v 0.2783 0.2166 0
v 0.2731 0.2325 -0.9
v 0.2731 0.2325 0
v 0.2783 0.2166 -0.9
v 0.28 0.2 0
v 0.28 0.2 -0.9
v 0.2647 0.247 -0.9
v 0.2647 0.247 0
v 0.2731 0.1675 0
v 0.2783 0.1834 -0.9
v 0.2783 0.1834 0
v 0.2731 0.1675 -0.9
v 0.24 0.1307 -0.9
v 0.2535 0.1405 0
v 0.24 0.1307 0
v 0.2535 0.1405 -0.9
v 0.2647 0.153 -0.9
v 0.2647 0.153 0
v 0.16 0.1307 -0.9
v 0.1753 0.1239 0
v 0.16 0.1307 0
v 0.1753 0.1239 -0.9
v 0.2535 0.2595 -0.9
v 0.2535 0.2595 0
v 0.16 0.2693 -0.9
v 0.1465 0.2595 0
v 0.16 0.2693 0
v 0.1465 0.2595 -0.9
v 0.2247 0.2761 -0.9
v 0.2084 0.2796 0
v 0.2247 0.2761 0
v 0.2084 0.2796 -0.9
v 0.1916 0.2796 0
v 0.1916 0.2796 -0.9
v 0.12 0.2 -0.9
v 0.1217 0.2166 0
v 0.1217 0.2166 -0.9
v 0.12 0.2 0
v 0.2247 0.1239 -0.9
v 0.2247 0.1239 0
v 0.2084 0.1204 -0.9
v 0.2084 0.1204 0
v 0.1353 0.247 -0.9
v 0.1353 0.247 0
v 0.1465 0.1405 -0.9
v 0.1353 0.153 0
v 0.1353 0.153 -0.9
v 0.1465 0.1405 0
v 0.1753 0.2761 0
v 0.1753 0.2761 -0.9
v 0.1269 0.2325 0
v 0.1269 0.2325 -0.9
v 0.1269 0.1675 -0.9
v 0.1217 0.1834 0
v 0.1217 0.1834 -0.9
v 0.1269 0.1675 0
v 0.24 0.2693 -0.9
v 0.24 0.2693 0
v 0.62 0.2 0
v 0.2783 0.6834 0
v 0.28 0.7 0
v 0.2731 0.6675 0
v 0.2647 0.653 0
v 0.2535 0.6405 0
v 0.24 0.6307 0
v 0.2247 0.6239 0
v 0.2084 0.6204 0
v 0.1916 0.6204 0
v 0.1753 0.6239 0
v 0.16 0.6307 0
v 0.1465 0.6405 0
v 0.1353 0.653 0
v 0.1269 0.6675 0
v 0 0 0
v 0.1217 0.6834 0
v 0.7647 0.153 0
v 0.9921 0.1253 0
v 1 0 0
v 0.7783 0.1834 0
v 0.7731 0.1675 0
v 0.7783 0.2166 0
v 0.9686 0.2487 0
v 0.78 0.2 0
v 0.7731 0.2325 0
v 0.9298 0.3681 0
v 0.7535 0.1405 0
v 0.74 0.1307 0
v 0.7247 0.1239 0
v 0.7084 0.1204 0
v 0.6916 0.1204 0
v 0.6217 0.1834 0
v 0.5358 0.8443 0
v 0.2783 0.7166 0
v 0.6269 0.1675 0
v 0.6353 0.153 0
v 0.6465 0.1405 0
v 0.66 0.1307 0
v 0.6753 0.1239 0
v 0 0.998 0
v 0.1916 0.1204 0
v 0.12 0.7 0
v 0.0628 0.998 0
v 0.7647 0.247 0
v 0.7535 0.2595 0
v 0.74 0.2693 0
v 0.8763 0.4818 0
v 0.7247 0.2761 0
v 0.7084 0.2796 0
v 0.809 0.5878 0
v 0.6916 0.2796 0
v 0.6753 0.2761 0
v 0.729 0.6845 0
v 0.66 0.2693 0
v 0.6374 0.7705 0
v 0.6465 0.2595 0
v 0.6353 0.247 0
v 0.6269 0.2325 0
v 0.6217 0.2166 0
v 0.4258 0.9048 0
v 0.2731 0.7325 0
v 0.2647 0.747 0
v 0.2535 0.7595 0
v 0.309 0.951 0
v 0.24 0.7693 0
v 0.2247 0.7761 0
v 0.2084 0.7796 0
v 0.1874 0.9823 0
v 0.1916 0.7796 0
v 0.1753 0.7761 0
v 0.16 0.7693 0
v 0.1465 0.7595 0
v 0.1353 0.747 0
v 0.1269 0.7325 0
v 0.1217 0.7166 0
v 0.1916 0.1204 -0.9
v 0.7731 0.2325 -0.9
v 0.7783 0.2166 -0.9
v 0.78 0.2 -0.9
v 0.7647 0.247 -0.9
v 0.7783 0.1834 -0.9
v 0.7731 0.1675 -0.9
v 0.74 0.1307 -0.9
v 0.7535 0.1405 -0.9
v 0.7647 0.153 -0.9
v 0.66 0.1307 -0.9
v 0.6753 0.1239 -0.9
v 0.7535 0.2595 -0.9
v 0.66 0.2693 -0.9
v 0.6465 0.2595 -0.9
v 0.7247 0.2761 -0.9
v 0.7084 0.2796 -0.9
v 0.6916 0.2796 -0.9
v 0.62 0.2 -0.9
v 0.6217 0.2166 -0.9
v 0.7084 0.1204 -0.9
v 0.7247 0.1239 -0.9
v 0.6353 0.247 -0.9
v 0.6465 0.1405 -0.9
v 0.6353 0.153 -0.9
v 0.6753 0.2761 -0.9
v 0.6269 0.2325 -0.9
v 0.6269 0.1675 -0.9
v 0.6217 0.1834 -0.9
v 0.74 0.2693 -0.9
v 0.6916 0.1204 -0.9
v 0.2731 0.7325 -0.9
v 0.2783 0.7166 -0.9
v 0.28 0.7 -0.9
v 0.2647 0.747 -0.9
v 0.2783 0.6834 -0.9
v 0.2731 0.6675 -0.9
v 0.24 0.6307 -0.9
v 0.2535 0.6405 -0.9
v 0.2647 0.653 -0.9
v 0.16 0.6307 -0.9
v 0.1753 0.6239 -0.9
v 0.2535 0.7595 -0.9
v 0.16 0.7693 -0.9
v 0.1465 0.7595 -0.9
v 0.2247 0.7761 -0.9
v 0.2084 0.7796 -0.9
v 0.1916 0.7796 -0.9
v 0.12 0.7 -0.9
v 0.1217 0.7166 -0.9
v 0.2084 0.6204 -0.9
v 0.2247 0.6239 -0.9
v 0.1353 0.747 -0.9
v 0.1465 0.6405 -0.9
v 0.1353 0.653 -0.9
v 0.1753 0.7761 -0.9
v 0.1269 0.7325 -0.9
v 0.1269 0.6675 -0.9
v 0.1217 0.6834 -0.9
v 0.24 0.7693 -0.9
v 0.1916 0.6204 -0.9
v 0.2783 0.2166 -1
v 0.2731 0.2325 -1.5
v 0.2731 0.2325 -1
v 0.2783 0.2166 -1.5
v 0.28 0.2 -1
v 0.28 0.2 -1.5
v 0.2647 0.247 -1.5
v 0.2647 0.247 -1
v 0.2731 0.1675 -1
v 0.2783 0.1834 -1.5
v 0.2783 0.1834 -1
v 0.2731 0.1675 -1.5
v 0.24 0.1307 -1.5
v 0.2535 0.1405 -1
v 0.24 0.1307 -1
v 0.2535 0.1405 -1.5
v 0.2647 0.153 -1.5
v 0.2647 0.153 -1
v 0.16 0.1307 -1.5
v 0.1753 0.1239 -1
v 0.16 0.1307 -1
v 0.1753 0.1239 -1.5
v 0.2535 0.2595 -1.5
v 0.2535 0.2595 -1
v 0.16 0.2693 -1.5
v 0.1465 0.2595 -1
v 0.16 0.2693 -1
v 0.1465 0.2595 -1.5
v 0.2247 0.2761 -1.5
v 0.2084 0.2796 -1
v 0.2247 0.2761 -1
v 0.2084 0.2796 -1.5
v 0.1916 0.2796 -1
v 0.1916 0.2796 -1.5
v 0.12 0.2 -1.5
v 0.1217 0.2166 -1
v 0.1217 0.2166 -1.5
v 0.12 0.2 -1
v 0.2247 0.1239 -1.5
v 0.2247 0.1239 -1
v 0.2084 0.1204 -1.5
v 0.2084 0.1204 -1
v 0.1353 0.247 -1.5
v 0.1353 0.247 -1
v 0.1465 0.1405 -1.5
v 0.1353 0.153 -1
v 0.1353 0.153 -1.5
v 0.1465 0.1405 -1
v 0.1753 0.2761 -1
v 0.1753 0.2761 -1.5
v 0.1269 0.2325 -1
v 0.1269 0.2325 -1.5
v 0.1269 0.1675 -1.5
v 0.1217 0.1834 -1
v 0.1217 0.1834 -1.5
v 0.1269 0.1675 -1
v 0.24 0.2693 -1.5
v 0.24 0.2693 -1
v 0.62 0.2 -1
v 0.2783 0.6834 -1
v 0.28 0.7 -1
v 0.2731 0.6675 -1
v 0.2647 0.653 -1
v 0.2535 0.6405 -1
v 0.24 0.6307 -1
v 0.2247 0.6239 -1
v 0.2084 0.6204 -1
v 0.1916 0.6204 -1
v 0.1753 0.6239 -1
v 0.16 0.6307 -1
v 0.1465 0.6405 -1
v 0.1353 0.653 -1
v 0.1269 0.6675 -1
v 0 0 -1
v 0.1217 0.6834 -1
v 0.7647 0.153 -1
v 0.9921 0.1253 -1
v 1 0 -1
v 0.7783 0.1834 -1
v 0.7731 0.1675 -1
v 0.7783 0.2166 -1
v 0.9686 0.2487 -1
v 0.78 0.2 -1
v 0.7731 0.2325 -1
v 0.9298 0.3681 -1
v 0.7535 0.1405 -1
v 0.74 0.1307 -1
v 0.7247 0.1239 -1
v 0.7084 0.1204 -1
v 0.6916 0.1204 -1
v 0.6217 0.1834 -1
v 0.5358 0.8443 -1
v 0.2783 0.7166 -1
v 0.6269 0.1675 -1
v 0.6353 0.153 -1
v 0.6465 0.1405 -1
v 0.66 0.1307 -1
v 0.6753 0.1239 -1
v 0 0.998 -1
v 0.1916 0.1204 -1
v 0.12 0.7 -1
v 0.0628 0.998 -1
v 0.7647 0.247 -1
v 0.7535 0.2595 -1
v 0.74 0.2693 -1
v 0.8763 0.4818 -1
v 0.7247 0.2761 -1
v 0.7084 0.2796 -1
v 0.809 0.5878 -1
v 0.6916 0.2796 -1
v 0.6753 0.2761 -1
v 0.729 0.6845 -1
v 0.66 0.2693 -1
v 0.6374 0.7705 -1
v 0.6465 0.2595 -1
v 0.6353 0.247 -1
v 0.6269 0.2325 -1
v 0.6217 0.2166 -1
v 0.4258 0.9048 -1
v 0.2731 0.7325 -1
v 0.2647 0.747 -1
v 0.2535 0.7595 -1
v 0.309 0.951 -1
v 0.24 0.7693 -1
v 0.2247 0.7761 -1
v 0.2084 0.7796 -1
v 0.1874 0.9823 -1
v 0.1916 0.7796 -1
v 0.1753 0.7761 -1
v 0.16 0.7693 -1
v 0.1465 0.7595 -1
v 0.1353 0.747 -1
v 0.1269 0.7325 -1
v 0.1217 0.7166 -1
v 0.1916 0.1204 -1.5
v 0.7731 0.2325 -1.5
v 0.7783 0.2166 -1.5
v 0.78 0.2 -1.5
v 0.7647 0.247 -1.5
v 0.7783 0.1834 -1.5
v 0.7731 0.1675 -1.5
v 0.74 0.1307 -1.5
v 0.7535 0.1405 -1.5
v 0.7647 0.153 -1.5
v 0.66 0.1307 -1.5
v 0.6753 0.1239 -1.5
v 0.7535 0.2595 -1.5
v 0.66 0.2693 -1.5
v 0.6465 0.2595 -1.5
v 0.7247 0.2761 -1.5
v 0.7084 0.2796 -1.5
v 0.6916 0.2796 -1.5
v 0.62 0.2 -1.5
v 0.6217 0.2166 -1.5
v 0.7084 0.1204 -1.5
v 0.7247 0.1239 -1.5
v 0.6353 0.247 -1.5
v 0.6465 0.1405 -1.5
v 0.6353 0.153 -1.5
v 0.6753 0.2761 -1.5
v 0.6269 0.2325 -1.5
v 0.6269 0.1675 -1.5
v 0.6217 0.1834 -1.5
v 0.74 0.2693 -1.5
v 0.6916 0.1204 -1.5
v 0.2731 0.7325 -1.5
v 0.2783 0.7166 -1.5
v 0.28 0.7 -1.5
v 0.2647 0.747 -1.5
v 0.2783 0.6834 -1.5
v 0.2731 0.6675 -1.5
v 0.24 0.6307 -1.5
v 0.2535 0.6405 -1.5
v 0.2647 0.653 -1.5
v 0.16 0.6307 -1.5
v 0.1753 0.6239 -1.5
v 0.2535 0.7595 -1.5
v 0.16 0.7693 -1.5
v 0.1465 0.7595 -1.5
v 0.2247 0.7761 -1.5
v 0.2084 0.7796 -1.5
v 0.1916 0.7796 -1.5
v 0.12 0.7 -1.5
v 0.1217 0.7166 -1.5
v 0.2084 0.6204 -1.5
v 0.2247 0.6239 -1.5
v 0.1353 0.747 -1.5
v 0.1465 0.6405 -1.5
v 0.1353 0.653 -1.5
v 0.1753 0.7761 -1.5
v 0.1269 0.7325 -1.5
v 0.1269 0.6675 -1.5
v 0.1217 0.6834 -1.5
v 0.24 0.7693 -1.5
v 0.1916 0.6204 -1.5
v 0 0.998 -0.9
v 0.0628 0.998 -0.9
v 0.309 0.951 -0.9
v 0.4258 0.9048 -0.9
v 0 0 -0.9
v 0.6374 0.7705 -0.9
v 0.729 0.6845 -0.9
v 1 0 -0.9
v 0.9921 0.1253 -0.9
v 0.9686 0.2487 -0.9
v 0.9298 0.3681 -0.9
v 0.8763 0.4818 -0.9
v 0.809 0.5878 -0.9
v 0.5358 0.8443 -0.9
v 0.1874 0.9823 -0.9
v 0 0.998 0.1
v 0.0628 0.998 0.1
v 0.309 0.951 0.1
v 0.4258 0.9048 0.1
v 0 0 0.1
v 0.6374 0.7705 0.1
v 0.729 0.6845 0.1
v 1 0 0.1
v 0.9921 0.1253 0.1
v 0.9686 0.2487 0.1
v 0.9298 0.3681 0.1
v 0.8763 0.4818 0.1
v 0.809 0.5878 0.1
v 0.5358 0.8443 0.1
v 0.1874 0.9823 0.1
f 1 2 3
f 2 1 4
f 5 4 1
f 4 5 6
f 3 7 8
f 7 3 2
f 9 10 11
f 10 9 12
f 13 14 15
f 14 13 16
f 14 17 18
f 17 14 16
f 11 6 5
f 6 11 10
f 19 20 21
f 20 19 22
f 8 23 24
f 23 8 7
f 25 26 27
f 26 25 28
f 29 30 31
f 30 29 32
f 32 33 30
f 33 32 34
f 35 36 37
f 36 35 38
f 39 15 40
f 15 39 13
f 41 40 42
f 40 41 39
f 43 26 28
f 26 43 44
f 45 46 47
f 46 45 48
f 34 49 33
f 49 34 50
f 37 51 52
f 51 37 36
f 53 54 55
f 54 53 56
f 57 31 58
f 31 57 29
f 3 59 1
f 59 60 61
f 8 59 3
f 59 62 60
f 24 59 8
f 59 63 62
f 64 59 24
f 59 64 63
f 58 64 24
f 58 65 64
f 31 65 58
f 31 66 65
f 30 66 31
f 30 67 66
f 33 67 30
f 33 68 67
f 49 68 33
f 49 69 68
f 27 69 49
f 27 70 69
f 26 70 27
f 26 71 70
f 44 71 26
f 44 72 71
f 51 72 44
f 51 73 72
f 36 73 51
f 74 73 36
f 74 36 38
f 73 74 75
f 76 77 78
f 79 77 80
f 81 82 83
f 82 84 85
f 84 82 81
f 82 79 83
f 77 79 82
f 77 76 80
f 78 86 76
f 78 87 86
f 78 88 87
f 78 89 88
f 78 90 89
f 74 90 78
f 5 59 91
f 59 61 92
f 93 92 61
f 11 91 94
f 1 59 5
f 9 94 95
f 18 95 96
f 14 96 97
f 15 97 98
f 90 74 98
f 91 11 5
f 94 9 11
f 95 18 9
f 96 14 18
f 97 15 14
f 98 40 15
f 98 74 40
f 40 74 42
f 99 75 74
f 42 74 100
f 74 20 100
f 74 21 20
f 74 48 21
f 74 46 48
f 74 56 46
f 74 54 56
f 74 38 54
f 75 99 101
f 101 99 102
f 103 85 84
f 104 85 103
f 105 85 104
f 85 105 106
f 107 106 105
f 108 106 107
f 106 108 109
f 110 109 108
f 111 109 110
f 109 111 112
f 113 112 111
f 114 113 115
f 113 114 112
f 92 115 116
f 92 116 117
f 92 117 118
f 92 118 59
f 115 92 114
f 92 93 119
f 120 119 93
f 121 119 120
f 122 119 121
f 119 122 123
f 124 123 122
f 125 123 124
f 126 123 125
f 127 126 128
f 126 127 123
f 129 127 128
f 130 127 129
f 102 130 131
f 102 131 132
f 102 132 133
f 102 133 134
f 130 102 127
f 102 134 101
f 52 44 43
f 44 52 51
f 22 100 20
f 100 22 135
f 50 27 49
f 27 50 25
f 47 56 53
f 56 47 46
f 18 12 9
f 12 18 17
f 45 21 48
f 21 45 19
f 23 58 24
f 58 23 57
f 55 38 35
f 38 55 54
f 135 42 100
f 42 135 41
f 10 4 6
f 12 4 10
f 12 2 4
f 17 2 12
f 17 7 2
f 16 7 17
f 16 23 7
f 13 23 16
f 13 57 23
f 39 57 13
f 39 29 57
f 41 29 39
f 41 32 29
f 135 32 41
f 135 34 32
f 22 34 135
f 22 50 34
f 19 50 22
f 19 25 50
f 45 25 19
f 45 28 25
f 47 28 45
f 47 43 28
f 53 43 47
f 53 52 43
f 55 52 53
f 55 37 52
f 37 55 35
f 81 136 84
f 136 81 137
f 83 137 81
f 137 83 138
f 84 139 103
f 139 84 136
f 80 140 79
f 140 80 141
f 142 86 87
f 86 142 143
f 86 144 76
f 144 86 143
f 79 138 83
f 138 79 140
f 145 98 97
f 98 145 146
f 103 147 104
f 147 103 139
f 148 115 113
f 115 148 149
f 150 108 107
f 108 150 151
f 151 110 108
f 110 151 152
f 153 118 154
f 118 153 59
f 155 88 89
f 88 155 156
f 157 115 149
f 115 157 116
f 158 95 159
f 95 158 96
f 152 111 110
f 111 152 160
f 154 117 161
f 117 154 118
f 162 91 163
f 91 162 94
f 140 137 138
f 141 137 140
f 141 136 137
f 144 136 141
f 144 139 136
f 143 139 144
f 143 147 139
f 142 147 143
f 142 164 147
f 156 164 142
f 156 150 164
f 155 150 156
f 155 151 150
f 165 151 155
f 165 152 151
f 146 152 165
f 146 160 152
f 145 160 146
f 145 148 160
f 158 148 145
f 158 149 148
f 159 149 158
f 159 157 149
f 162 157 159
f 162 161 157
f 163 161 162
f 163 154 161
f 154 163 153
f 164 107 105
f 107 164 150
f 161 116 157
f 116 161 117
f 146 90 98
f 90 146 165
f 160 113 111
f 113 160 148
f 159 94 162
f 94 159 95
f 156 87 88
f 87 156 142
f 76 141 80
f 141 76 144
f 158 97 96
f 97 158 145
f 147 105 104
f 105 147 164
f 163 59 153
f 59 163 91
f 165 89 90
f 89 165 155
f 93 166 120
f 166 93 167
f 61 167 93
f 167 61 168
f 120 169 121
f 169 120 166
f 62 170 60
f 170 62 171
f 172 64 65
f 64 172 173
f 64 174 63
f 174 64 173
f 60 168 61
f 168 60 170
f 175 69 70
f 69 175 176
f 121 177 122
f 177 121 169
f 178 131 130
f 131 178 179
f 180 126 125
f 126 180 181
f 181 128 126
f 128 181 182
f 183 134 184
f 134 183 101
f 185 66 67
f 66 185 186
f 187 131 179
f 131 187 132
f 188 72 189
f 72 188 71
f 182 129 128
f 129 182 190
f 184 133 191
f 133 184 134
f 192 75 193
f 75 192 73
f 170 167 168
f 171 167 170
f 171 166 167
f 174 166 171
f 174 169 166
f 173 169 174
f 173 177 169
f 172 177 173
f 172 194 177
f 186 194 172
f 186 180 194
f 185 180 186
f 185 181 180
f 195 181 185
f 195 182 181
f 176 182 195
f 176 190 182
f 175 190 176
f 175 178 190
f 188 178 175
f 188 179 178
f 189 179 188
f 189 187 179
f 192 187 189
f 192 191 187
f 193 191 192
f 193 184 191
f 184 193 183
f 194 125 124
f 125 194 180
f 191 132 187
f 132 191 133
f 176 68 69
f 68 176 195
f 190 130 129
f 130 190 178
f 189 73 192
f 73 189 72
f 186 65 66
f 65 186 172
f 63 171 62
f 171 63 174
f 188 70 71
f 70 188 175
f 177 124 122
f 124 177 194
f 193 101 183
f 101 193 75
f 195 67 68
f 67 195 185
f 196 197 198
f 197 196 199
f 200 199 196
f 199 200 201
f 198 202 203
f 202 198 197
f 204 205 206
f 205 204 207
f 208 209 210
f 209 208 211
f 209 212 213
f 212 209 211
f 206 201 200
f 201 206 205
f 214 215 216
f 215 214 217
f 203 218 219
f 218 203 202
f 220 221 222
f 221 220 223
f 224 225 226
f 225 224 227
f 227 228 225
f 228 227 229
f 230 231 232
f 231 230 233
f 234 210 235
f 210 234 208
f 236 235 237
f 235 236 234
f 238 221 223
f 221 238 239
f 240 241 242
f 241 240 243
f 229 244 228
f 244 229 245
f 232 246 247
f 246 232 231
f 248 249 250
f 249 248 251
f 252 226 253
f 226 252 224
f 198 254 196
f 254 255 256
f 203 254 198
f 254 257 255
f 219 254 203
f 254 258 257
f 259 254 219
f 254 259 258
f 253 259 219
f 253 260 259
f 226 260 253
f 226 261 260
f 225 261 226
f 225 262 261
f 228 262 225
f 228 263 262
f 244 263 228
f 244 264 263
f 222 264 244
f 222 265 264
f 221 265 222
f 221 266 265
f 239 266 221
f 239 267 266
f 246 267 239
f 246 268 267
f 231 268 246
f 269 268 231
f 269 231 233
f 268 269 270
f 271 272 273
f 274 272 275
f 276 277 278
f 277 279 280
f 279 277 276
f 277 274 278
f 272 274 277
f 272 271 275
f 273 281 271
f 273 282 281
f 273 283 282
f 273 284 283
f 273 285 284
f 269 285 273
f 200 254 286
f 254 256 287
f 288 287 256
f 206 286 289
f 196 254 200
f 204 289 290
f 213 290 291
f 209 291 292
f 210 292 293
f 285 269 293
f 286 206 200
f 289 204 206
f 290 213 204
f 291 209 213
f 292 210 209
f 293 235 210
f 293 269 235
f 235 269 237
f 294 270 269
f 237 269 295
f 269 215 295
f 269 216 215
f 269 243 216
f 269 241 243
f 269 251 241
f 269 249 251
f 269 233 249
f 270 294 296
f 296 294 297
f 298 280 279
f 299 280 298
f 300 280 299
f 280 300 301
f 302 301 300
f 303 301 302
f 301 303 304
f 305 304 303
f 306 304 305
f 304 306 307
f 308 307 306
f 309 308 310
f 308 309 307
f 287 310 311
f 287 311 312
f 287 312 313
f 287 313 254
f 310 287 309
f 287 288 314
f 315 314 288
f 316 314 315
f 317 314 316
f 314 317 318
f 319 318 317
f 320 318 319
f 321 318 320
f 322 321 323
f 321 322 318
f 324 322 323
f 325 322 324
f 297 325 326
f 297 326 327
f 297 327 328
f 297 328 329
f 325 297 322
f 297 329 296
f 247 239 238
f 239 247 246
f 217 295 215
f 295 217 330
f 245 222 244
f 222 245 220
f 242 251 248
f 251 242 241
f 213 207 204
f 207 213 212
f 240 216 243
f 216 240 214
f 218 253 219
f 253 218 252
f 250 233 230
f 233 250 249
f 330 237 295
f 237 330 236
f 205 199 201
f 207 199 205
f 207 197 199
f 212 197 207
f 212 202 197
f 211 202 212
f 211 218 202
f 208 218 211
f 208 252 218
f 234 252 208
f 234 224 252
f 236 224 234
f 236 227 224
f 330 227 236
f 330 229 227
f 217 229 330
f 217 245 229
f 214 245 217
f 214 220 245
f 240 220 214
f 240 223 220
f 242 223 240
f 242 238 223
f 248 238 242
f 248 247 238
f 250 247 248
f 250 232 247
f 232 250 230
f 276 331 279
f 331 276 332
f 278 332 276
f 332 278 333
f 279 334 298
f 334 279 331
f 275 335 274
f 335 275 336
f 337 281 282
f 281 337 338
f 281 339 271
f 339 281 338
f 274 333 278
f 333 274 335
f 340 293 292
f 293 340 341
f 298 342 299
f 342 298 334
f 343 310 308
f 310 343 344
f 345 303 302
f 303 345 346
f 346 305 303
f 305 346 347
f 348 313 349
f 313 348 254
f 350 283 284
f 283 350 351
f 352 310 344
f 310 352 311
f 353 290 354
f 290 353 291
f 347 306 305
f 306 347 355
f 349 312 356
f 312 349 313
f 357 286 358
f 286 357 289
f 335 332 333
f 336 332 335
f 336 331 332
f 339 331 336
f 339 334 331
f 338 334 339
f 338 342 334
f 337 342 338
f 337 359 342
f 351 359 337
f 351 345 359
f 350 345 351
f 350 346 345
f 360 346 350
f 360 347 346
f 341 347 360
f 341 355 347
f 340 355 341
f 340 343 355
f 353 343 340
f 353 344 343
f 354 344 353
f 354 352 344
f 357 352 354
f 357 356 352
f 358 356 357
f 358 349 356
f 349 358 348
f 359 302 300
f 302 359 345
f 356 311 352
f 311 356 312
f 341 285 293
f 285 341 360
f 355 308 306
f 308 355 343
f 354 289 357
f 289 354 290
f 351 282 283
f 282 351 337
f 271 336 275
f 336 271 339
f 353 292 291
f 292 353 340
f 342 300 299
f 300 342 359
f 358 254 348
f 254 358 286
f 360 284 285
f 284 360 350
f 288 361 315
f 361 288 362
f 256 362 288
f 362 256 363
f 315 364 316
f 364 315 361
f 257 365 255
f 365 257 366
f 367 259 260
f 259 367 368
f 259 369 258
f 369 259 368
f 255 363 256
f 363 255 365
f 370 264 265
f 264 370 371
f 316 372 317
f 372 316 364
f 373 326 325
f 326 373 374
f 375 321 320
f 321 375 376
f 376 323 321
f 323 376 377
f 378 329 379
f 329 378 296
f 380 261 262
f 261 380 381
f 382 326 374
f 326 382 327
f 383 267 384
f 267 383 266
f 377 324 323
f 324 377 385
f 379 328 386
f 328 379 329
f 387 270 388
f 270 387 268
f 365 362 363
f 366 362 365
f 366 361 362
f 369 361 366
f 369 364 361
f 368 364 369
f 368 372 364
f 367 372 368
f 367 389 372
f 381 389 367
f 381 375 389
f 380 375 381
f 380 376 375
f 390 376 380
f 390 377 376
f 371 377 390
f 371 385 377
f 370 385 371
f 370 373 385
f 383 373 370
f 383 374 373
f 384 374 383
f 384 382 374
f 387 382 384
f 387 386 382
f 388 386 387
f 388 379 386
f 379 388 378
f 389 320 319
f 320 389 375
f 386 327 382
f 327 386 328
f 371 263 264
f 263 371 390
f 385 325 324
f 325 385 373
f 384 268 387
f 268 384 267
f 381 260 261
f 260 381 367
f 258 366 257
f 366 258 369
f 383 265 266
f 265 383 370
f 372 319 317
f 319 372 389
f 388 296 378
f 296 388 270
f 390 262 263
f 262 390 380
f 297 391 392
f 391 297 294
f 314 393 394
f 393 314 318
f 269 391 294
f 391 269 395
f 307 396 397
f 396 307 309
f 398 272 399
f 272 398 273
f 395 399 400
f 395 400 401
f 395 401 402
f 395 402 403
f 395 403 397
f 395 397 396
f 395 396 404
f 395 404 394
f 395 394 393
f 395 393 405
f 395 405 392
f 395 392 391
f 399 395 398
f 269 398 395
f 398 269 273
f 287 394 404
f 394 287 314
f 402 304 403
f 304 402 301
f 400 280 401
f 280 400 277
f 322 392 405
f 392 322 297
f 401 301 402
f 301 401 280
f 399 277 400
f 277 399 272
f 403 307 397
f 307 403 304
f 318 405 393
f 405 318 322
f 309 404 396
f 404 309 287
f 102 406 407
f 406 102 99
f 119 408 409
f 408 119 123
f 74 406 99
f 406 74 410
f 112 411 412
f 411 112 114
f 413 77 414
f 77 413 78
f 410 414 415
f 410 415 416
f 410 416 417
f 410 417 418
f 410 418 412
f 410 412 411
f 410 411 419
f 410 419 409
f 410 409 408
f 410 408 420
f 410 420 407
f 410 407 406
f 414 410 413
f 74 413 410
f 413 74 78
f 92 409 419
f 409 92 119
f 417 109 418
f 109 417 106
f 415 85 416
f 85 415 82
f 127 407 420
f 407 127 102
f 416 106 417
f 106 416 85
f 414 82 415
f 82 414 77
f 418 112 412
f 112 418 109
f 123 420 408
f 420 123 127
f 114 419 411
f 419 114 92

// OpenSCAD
module Table_Small(){

color("#954520")
linear_extrude(height = 0.10)

intersection(){

circle(1, $fn=50);

square(1);


}

color("#4f200f"){
translate([0.2,0.2,-0.9])
cylinder(0.9,0.08,0.08, $fn =30);


translate([0.7,0.2,-0.9])
cylinder(0.9,0.08,0.08, $fn =30);


translate([0.2,0.7,-0.9])
cylinder(0.9,0.08,0.08, $fn =30);
}

translate([0,0,-1]){
color("#954520")
linear_extrude(height = 0.10)

intersection(){

circle(1, $fn=50);

square(1);

}


color("#4f200f"){
translate([0.2,0.2,-0.5])
cylinder(0.5,0.08,0.08, $fn =30);


translate([0.7,0.2,-0.5])
cylinder(0.5,0.08,0.08, $fn =30);


translate([0.2,0.7,-0.5])
cylinder(0.5,0.08,0.08, $fn =30);
}
}

}

Table_Small();
